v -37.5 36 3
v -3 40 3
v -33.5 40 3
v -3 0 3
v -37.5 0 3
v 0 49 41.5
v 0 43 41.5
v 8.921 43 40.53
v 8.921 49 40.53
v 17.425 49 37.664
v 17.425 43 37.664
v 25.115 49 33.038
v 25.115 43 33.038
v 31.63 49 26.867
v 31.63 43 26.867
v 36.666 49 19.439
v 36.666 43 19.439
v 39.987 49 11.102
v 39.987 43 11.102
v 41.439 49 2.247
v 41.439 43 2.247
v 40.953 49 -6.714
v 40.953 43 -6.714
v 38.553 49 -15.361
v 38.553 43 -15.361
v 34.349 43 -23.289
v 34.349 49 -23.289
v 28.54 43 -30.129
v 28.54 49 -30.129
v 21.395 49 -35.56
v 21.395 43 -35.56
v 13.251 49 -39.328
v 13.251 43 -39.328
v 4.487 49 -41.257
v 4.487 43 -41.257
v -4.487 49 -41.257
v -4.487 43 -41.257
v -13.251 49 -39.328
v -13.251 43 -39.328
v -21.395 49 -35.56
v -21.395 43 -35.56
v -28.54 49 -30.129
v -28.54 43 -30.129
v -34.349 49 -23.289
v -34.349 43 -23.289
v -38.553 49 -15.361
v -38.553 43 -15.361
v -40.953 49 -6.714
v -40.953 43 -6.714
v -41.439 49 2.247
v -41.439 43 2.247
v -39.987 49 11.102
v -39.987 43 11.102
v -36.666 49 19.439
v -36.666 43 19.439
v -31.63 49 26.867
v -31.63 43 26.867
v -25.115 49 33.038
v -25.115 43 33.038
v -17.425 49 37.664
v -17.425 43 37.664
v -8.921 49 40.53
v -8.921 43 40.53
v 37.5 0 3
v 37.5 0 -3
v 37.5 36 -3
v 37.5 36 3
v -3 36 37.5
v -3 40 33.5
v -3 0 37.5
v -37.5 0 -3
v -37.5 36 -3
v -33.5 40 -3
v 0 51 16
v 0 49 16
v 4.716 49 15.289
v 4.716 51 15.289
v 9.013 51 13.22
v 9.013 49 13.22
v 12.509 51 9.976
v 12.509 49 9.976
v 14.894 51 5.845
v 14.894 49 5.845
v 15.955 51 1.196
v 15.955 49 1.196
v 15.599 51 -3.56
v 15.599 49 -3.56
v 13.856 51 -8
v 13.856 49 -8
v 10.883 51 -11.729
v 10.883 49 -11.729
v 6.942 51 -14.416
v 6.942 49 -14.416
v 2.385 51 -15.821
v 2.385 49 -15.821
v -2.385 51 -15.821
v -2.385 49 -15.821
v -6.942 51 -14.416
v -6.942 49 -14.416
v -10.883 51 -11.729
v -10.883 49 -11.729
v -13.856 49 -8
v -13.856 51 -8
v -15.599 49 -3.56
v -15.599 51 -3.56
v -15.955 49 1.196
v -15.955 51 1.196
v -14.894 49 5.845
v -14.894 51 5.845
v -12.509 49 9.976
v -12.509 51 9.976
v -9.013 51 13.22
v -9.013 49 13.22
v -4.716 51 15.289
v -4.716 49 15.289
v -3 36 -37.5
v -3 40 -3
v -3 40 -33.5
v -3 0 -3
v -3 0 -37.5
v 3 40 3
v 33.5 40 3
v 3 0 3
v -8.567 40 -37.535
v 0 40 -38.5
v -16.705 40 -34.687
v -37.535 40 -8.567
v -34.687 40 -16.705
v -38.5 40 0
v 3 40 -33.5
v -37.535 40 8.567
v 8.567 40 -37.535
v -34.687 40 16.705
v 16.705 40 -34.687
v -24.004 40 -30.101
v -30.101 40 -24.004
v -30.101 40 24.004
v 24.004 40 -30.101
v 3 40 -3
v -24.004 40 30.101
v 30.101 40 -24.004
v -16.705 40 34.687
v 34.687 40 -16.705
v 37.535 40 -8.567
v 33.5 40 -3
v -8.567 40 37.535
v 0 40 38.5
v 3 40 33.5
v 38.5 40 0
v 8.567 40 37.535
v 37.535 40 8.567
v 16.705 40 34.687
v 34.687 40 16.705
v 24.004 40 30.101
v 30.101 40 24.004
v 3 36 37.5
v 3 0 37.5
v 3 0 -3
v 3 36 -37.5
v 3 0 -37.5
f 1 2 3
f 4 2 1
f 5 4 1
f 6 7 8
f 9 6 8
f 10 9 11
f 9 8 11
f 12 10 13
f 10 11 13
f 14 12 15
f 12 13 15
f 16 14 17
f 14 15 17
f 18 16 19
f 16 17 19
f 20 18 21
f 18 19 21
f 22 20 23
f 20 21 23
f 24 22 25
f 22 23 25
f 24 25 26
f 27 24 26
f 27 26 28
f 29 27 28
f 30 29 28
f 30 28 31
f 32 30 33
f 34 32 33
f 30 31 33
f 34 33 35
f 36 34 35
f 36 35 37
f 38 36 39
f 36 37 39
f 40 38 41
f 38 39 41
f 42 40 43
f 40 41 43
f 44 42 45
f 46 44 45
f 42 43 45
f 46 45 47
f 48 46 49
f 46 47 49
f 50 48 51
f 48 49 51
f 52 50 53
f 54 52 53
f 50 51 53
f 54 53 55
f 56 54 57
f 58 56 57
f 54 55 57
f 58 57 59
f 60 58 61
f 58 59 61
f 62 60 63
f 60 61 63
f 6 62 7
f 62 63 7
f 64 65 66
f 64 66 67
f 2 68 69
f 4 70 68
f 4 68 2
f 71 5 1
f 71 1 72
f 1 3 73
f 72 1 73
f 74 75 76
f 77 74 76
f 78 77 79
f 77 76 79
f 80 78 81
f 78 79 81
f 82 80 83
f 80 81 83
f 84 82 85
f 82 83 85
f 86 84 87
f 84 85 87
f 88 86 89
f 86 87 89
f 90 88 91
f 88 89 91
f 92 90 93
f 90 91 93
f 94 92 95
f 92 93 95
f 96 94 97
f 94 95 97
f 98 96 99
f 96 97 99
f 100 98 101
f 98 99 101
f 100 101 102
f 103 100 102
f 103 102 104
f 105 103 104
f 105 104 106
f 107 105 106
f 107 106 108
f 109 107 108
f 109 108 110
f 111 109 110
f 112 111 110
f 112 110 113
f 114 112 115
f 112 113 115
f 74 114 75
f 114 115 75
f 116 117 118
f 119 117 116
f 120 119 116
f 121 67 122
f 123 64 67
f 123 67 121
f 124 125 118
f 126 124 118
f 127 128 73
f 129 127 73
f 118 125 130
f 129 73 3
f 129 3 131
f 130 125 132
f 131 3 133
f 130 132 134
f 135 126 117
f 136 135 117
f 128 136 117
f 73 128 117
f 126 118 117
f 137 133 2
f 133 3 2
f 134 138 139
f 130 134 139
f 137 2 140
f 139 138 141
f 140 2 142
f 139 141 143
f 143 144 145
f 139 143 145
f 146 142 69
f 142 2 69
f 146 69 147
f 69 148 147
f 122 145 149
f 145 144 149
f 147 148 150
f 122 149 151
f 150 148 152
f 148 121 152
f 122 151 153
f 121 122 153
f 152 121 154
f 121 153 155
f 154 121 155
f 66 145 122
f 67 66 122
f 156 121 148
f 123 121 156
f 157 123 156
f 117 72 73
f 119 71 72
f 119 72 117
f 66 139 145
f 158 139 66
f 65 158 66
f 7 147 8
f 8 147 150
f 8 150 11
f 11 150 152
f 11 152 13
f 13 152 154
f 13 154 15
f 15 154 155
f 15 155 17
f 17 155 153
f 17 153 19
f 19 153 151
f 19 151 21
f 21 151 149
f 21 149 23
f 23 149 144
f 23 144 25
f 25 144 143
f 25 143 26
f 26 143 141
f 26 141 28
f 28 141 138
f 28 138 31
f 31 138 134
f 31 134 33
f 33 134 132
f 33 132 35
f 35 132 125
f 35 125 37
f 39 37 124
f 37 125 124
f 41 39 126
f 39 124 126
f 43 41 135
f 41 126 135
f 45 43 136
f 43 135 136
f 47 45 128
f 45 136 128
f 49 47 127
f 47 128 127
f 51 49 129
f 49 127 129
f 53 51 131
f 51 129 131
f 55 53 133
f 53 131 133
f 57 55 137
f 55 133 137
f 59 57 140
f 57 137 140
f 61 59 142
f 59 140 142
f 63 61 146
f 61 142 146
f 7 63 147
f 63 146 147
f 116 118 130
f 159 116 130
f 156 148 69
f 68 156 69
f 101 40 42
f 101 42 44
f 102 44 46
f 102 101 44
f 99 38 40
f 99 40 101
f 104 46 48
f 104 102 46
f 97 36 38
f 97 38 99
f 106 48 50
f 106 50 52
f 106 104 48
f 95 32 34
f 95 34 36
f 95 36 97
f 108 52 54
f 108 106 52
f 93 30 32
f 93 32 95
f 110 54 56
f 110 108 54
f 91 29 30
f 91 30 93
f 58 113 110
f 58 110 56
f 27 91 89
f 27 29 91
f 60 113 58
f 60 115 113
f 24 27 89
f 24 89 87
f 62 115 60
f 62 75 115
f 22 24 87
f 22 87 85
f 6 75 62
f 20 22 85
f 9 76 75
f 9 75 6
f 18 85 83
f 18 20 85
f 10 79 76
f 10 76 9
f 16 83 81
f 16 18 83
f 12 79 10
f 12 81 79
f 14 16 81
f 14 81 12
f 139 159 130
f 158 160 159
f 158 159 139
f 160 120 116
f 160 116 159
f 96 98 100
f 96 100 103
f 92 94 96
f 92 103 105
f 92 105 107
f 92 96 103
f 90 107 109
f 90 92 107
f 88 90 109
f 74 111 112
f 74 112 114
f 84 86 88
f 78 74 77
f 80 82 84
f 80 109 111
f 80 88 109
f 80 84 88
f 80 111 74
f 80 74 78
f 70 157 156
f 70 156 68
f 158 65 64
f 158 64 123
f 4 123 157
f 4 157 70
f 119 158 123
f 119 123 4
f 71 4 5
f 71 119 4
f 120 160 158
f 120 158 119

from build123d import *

# Parameters (mm, degrees)
BOSS_EXTRUDE1_DEPTH = 40
CHAMFER1_SIZE       = 4
SKETCH3_R           = 41.5
BOSS_EXTRUDE2_DEPTH = 9
SKETCH4_R           = 16
BOSS_EXTRUDE3_DEPTH = 2
CHAMFER2_SIZE       = 3


with BuildPart() as part:
    # Sketch1 → Boss-Extrude1 (new body)
    with BuildSketch(Plane(origin=(0, 0, 0), x_dir=(1, 0, 0), z_dir=(0, 1, 0))):
        Polygon((3, 3), (37.5, 3), (37.5, -3), (3, -3), (3, -37.5), (-3, -37.5), (-3, -3), (-37.5, -3), (-37.5, 3), (-3, 3), (-3, 37.5), (3, 37.5), align=None)
    extrude(amount=BOSS_EXTRUDE1_DEPTH)

    # Chamfer1
    chamfer1_edges = [part.edges().sort_by_distance(p)[0] for p in [
        (0, 40, -37.5),
        (-37.5, 40, 0),
        (0, 40, 37.5),
        (37.5, 40, 0),
    ]]
    chamfer(chamfer1_edges, length=CHAMFER1_SIZE)

    # Sketch3 → Boss-Extrude2 (add)
    with BuildSketch(Plane(origin=(0, 40, 0), x_dir=(1, 0, 0), z_dir=(0, 1, 0))):
        with Locations(Location((0, 0, 0), (0, 0, 270))):
            Circle(SKETCH3_R)
    extrude(amount=BOSS_EXTRUDE2_DEPTH)

    # Sketch4 → Boss-Extrude3 (add)
    with BuildSketch(Plane(origin=(0, 49, 0), x_dir=(1, 0, 0), z_dir=(0, 1, 0))):
        with Locations(Location((0, 0, 0), (0, 0, 270))):
            Circle(SKETCH4_R)
    extrude(amount=BOSS_EXTRUDE3_DEPTH)

    # Chamfer2
    chamfer2_edges = [part.edges().sort_by_distance(p)[0] for p in [
        (0, 40, -41.5),
    ]]
    chamfer(chamfer2_edges, length=CHAMFER2_SIZE)


solid = part.part
